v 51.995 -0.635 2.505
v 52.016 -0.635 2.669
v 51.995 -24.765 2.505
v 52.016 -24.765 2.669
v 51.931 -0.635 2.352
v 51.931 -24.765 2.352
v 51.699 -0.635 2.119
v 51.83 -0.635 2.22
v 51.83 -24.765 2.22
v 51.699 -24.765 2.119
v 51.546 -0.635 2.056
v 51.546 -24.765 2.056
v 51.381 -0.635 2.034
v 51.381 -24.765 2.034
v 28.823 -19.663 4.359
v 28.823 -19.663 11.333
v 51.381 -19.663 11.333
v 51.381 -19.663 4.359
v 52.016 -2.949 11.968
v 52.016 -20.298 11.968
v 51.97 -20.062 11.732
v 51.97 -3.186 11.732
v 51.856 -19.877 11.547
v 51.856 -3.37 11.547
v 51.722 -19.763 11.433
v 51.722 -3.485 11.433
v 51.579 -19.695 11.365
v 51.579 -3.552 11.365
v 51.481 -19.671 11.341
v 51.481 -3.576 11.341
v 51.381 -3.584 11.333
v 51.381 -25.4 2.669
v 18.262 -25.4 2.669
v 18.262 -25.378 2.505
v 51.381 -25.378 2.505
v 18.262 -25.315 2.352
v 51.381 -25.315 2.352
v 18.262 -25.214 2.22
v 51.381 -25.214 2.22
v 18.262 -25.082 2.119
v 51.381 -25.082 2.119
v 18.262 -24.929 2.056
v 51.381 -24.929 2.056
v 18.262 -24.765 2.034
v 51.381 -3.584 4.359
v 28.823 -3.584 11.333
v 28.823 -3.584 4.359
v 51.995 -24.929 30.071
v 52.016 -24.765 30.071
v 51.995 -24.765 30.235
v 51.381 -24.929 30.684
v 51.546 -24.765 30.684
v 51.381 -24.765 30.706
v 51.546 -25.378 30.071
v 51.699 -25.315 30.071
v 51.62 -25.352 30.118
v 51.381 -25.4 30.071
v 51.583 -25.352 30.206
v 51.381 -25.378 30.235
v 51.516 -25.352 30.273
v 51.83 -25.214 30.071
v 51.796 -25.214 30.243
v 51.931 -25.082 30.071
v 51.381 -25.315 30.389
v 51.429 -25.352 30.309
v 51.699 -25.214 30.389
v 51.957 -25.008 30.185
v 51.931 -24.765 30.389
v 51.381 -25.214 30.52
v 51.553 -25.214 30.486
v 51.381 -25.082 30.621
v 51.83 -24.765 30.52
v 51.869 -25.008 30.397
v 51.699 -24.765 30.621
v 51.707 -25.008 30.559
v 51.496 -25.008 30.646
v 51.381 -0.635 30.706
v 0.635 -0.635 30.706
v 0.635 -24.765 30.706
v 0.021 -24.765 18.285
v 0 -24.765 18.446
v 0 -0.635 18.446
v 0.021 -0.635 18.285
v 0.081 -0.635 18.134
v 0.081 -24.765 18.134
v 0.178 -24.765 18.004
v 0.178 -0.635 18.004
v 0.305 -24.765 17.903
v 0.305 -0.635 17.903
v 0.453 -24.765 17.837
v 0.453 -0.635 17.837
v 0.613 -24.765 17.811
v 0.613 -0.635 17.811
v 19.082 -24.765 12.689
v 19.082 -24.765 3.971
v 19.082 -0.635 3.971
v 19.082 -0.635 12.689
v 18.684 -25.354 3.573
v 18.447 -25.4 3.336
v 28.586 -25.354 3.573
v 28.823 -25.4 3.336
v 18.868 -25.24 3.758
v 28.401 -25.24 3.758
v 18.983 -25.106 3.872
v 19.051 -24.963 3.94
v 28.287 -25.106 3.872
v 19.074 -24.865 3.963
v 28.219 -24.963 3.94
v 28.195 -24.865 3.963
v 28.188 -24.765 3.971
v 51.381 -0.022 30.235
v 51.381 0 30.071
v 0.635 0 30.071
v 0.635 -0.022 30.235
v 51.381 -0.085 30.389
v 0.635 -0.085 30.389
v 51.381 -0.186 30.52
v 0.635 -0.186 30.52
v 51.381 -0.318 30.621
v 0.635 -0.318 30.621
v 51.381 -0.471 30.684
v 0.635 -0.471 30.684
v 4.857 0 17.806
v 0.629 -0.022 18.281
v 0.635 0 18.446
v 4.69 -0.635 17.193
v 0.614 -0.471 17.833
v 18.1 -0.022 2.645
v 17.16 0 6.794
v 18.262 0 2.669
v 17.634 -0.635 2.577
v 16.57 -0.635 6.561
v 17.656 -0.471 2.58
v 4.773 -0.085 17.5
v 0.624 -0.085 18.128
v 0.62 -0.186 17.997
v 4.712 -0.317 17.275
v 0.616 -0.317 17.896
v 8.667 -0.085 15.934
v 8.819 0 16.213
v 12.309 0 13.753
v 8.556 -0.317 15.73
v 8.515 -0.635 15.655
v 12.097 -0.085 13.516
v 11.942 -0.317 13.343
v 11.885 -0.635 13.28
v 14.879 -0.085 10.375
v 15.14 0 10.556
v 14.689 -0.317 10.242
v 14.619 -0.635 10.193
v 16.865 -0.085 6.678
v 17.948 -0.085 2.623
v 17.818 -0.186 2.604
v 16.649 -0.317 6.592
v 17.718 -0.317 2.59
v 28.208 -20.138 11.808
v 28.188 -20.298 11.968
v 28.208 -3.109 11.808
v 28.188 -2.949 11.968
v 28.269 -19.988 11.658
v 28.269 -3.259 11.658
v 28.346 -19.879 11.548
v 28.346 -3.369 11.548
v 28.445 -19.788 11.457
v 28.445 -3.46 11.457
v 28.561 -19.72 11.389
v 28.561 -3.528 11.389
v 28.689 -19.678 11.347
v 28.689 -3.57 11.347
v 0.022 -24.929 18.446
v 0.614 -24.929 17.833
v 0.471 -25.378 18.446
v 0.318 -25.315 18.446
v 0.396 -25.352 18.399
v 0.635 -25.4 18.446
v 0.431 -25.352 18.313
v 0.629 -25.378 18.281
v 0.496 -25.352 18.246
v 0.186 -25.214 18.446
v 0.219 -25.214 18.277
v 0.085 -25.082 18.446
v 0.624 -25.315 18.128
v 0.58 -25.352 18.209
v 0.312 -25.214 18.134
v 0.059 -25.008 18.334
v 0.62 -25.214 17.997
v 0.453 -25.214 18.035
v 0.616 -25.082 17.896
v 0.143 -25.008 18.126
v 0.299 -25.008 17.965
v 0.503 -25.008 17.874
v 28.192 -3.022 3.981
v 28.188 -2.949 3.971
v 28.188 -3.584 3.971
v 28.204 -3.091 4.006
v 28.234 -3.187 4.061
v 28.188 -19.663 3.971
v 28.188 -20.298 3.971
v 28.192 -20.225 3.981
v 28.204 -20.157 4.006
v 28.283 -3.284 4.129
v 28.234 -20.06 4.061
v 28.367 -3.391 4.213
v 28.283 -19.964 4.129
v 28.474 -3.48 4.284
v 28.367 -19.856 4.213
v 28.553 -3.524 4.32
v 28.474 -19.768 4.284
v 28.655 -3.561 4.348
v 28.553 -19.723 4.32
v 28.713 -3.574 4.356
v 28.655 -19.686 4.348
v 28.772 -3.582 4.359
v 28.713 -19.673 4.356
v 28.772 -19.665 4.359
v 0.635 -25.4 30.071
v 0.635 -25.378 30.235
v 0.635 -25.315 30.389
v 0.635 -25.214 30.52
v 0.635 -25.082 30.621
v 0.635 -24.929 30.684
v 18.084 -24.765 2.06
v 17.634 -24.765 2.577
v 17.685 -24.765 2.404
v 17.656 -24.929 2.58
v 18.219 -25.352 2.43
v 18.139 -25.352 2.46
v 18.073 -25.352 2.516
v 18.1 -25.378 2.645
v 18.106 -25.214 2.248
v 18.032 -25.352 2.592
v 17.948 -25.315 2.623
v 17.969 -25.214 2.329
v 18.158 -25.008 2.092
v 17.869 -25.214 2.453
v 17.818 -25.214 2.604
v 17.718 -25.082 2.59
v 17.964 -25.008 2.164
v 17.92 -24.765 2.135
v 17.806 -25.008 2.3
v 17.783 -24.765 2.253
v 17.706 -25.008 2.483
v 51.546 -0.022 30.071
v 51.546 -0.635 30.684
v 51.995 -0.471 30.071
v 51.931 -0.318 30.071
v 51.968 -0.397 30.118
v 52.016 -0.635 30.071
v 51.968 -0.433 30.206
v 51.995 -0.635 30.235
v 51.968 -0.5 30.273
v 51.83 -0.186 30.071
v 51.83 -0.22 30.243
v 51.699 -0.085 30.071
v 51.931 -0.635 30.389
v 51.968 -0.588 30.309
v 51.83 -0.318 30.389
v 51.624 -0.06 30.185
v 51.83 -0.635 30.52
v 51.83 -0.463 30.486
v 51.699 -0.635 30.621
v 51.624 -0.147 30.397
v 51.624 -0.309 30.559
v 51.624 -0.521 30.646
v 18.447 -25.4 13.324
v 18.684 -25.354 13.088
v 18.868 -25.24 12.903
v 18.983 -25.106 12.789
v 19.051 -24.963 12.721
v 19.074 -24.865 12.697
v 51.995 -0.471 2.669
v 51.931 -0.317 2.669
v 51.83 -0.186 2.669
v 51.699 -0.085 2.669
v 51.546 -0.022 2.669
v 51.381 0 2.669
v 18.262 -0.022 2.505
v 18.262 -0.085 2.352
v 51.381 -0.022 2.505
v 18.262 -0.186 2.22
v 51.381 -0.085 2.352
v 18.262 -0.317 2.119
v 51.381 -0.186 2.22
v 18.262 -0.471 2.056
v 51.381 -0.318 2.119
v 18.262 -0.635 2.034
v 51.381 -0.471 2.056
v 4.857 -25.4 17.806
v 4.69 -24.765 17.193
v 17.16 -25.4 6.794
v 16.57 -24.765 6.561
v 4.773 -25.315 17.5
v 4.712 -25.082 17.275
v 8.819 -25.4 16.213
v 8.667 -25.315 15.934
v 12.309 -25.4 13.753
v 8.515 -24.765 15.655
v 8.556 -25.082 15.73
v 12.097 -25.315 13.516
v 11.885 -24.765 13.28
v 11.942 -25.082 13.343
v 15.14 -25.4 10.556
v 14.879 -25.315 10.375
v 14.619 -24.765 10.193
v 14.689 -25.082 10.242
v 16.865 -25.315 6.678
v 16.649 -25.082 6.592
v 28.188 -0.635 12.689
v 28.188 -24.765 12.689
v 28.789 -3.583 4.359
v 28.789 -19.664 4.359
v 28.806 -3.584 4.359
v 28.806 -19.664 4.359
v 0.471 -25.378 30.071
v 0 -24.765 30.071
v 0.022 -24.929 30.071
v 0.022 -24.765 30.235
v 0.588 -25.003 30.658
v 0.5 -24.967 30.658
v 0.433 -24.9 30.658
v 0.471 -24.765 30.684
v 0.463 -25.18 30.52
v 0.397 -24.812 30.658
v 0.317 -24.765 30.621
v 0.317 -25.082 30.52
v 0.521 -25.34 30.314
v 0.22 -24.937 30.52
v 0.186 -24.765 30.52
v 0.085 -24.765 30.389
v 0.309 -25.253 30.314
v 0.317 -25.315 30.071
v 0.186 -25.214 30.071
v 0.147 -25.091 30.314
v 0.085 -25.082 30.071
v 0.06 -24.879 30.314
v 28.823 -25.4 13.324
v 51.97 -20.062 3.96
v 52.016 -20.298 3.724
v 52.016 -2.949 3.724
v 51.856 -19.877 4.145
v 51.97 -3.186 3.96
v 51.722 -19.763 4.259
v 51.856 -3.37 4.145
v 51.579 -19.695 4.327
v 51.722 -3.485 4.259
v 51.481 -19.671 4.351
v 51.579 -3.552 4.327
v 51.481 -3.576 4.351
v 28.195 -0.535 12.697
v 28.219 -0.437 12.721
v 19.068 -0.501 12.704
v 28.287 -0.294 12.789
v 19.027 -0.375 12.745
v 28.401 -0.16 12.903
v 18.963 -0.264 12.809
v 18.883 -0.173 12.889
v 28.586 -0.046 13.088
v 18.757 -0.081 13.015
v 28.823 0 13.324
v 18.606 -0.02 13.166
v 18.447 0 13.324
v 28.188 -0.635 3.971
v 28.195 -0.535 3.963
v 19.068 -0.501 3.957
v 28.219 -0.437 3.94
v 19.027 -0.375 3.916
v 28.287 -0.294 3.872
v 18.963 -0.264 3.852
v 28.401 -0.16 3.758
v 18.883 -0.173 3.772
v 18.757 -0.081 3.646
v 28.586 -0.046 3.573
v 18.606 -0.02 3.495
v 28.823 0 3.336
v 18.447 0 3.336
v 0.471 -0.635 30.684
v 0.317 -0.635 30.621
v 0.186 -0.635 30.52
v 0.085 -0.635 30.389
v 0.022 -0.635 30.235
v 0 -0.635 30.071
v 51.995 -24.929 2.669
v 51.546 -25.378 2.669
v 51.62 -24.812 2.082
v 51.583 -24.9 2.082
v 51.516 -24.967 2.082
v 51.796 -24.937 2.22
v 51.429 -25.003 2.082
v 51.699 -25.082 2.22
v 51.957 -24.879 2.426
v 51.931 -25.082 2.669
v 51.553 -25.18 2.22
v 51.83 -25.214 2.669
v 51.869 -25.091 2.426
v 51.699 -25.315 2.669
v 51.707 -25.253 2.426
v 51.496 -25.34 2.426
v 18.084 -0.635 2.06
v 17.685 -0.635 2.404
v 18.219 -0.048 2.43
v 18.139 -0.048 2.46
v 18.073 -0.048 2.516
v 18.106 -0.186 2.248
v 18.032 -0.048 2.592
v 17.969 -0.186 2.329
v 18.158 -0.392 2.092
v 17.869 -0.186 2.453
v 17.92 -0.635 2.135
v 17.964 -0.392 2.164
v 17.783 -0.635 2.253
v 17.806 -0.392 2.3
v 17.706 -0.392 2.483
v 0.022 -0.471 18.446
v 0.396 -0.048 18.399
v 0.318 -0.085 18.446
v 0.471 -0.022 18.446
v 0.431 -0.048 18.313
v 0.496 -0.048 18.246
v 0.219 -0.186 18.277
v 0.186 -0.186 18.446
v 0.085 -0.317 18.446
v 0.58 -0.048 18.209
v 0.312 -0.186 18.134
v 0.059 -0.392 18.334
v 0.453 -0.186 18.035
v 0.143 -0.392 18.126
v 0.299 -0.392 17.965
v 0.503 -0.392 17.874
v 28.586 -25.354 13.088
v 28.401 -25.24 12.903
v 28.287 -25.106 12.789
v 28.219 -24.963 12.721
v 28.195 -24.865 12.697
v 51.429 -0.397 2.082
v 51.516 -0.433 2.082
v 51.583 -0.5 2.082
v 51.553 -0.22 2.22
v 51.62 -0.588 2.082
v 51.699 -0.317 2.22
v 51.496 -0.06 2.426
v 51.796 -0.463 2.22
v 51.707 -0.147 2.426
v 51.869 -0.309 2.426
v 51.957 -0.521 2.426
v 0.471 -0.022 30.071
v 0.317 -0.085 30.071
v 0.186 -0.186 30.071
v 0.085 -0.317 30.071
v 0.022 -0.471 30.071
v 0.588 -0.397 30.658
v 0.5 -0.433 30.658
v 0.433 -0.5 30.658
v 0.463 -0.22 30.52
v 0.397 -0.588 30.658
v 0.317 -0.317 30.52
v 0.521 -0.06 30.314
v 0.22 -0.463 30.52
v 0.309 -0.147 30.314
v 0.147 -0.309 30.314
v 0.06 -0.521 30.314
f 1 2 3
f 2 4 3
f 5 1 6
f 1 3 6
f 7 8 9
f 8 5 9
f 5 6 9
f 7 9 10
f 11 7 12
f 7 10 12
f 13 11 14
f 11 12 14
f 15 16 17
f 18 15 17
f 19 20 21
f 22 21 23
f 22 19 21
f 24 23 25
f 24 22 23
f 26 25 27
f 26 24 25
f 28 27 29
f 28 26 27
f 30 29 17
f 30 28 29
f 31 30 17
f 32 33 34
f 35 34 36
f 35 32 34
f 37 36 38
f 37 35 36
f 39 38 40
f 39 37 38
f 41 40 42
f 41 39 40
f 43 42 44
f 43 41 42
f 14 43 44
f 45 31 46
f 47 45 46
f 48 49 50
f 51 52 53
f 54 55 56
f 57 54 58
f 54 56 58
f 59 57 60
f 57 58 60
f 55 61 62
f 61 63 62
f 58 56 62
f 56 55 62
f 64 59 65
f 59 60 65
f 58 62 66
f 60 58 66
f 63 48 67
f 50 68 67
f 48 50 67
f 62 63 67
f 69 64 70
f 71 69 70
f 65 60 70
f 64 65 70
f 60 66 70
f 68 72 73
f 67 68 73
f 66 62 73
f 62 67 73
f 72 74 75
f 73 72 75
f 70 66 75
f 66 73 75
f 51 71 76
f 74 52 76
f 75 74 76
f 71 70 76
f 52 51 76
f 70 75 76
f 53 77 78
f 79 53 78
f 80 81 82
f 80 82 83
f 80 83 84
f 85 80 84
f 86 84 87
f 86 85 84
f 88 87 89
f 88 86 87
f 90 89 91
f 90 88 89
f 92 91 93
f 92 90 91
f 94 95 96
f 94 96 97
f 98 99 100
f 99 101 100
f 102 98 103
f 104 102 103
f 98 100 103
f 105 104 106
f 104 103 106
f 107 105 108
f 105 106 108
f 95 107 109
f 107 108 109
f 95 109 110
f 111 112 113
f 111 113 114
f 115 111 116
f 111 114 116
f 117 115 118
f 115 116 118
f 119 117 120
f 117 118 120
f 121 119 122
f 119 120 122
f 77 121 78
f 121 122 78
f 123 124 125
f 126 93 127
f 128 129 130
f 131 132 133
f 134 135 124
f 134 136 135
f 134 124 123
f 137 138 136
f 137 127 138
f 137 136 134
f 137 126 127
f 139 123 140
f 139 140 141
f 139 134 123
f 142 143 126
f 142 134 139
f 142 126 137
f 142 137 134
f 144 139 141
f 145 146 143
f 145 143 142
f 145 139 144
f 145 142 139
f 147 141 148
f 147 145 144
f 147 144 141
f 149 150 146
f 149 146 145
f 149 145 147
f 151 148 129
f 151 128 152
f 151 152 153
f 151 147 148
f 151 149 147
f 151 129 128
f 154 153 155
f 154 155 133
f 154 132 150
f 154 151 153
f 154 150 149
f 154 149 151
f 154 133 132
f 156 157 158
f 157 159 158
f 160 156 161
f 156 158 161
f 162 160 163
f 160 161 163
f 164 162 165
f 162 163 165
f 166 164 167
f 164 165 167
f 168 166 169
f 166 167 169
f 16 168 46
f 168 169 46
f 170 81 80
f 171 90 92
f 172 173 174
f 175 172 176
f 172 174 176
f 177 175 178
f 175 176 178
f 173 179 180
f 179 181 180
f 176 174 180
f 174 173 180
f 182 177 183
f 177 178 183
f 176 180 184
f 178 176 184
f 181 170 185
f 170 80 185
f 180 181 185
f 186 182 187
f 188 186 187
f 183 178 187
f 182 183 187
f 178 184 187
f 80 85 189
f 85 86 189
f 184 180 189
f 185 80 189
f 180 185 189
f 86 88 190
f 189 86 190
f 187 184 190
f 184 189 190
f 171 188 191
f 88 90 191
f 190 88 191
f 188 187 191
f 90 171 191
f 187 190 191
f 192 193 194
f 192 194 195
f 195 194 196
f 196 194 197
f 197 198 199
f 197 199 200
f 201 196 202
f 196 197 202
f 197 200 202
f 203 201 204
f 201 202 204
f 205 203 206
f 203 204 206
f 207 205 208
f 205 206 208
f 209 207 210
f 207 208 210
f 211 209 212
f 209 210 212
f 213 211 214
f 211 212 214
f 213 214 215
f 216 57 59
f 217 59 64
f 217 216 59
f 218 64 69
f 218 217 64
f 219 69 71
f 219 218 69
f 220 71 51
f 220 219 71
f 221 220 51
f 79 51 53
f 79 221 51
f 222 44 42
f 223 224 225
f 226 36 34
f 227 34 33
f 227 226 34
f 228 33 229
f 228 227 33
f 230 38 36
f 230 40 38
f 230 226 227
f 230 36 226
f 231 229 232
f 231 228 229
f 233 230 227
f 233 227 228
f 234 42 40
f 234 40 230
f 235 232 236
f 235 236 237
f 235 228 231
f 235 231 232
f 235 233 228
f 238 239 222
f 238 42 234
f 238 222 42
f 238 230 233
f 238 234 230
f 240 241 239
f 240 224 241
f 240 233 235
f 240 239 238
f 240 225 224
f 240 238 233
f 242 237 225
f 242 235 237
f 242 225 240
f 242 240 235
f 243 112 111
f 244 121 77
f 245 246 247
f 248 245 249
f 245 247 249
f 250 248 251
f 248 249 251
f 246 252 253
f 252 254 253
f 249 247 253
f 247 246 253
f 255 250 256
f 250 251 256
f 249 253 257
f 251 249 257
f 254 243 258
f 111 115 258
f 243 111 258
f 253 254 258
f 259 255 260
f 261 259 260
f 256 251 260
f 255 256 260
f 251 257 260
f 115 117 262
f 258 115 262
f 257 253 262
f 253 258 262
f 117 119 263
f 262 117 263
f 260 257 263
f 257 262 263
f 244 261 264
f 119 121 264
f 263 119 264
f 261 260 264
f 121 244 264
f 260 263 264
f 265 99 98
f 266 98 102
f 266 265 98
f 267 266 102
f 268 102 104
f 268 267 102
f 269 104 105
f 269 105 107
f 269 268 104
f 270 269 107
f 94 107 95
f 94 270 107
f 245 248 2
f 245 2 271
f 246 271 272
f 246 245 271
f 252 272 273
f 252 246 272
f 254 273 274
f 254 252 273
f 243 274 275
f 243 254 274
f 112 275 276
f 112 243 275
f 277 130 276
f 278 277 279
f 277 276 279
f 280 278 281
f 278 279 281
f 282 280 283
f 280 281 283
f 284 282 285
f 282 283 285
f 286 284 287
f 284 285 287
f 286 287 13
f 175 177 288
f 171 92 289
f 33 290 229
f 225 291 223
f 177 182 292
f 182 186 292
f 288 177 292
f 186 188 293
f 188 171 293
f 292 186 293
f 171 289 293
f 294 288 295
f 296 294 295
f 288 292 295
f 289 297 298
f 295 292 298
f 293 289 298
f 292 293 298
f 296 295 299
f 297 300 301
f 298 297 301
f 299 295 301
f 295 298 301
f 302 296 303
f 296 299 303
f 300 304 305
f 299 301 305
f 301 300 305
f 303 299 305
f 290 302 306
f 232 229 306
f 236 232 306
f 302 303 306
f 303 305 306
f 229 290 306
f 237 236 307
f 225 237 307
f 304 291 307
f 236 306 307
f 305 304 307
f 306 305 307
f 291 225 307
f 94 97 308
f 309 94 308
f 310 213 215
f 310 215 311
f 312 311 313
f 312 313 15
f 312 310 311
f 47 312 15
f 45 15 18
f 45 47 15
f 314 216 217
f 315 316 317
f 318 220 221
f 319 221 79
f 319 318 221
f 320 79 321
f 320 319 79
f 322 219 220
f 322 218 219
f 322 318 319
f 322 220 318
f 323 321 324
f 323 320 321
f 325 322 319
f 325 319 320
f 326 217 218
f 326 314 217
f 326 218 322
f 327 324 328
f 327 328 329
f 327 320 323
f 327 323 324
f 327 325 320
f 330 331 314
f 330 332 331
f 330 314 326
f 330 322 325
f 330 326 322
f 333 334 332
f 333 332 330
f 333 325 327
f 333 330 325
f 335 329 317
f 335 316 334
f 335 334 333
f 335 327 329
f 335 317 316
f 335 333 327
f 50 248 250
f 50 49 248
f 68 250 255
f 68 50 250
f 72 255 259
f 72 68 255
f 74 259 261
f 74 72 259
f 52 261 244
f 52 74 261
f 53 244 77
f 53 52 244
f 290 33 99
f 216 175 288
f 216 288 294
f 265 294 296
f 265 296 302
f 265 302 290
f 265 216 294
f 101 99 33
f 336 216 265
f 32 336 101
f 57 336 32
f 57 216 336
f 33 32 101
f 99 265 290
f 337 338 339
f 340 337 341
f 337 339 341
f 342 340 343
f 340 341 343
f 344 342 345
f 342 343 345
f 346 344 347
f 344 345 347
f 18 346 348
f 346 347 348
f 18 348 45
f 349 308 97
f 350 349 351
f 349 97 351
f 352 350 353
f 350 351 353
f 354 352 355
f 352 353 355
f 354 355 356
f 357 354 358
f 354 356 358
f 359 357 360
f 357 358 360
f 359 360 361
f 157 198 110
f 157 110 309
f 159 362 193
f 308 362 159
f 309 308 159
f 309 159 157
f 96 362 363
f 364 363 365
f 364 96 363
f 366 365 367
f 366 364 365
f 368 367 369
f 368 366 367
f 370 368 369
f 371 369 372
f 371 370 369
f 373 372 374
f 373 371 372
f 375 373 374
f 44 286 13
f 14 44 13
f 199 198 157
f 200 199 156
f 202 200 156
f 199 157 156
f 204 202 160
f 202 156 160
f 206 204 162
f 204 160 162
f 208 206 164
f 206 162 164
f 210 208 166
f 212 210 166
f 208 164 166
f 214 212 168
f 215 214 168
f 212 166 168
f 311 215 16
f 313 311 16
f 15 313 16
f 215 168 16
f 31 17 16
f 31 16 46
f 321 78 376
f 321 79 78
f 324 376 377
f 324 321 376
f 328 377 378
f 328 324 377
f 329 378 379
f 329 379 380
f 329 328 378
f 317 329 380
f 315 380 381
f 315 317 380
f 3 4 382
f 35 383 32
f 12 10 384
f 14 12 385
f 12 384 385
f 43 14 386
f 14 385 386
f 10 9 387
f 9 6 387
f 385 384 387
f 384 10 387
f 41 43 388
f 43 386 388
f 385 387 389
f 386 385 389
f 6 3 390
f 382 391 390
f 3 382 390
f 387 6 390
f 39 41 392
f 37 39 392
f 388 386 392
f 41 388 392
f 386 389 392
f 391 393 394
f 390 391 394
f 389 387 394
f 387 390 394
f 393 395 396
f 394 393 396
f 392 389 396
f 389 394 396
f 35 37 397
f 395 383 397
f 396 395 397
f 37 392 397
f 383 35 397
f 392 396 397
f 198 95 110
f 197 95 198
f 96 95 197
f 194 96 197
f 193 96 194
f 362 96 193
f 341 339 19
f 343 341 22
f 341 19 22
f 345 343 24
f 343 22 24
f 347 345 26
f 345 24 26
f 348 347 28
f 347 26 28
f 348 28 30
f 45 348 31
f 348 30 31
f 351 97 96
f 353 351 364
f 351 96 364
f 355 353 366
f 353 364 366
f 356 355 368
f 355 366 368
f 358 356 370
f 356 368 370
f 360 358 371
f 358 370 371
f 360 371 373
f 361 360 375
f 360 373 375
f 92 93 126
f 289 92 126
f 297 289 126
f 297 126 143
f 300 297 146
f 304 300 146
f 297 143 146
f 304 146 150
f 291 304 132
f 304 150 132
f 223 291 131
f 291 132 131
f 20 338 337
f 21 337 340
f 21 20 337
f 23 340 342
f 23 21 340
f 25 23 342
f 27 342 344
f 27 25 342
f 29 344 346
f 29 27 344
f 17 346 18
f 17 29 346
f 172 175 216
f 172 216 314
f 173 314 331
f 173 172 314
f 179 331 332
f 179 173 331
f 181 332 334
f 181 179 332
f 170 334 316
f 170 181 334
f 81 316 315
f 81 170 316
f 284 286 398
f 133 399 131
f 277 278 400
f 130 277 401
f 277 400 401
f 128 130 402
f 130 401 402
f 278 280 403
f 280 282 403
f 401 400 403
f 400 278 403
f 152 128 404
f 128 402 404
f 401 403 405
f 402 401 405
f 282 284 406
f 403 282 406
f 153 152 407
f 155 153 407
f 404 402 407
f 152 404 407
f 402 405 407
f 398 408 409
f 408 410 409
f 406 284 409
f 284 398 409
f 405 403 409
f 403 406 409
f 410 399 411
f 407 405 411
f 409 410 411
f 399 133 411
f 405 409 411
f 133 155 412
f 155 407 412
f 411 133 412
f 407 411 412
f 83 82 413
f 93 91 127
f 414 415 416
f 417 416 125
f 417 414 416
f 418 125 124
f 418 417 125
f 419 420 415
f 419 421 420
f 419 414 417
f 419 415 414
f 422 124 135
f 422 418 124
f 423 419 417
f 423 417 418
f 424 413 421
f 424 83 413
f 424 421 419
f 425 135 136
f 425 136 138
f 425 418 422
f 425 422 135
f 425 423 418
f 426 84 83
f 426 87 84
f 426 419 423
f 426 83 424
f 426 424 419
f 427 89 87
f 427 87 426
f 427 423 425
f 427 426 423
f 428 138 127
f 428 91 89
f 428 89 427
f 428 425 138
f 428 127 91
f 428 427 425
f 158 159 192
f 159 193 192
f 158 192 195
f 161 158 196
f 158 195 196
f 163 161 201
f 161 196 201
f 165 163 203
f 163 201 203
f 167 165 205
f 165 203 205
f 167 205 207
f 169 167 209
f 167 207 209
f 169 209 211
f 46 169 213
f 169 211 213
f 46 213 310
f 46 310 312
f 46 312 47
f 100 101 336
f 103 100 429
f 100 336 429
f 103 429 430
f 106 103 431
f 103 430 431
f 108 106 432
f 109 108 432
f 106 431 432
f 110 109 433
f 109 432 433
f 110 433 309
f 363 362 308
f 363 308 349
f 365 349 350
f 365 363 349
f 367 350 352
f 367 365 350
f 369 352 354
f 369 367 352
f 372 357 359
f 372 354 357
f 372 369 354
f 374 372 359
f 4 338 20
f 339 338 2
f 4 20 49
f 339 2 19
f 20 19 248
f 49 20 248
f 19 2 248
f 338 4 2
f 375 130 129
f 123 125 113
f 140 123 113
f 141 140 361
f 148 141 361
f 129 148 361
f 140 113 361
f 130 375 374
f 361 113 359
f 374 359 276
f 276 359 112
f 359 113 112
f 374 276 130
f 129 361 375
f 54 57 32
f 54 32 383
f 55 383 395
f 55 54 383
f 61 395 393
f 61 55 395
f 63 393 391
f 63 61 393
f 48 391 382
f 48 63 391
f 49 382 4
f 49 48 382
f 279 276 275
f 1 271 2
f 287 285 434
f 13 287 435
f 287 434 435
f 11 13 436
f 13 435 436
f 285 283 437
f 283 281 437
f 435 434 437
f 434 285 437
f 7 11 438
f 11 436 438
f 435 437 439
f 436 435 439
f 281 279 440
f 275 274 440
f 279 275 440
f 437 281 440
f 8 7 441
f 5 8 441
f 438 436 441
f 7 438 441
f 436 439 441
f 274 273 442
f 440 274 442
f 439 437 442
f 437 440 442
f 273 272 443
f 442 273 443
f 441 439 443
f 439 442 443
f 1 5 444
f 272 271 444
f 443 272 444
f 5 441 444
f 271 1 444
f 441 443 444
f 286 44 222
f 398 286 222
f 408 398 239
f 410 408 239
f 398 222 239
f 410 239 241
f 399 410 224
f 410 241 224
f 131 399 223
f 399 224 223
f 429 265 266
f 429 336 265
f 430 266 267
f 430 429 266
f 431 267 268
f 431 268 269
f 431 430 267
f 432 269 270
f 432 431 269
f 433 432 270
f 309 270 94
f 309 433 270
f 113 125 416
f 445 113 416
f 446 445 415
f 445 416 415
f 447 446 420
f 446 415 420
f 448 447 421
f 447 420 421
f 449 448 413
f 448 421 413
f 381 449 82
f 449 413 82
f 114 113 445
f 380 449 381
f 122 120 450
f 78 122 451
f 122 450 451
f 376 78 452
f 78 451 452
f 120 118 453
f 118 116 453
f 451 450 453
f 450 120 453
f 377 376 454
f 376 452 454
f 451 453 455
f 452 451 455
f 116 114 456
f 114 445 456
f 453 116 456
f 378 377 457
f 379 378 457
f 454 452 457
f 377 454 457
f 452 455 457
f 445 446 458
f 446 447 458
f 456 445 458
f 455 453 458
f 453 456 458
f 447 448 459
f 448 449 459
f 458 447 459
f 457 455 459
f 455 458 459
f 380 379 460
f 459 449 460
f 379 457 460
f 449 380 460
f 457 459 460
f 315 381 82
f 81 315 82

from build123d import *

# Parameters (mm, degrees)
F0_W         = 9.105252102
F0_H         = 8.7177967653
F1_DEPTH     = 25.4
F2_W         = 16.0794917028
F2_H         = 6.9742375053
F3_DEPTH     = 23.8286424428
F4_R         = 0.635
F5_T1_DEPTH  = 16.0794917028
F5_T3_DEPTH  = 6.9742375053
F5_T5_DEPTH  = 8.7177967653
F5_T7_DEPTH  = 9.105252102
F5_T13_DEPTH = 17.6669917028
F5_T17_DEPTH = 8.5617375053
F5_T25_DEPTH = 17.6669917028
F5_T29_DEPTH = 8.5617375053
F5_T37_DEPTH = 8.5617375053
F5_T42_DEPTH = 17.5413992589
F5_T49_DEPTH = 17.5413992589
F5_T53_DEPTH = 8.5617375053
F5_T61_DEPTH = 10.3052967653
F5_T65_DEPTH = 10.692752102
F5_T72_DEPTH = 10.692752102
F5_T76_DEPTH = 10.3052967653
F5_T83_DEPTH = 10.692752102
F5_T87_DEPTH = 10.3052967653
F5_T94_DEPTH = 10.3052967653
F5_T98_DEPTH = 10.692752102
F6_R         = 0.635


# Not quite as in the source:
# - a fillet or chamfer that OpenCascade refuses, or shapes differently, is made with other operations: its cross-section is extruded or revolved along the edge and cut away or added


with BuildPart() as f1:
    # F0 (on Front) → F1 (new body)
    with BuildSketch(Plane.XZ):
        with BuildLine():
            ThreePointArc((0, 17.8214723471), (11.860718486, 13.3014372763), (17.7050021368, 2.0341523923))
            Line((17.7050021368, 2.0341523923), (52.0161837339, 2.0341523923))
            Line((52.0161837339, 2.0341523923), (52.0161837339, 30.7060163468))
            Line((52.0161837339, 30.7060163468), (0, 30.7060163468))
            Line((0, 30.7060163468), (0, 17.8214723471))
        make_face()
        with Locations((23.6349152401, 8.3303391002)):
            Rectangle(F0_W, F0_H, mode=Mode.SUBTRACT)
    extrude(amount=F1_DEPTH)

    # F2 (on face) → F3 (cut, through all)
    with BuildSketch(Plane.YZ.offset(52.0161837339)):
        with Locations((-11.6237296024, 7.8460171353)):
            Rectangle(F2_W, F2_H)
    extrude(amount=-F3_DEPTH, mode=Mode.SUBTRACT)

    # F4
    f4_edges = [f1.edges().sort_by_distance(p)[0] for p in [
        (23.634915, -25.4, 3.971441),
        (19.082289, -25.4, 8.330339),
        (23.634915, -25.4, 12.689237),
        (28.187541, -25.4, 8.330339),
        (52.016184, -11.62373, 4.358898),
        (52.016184, -19.663475, 7.846017),
        (52.016184, -11.62373, 11.333136),
        (52.016184, -3.583984, 7.846017),
    ]]
    fillet(f4_edges, radius=F4_R)

    # F5: fillet of radius 0.635 on 8 edges, made by hand

    # F5_s2 → F5_t1 (cut)
    with BuildSketch(Plane.XZ.offset(3.583983751)):
        with BuildLine():
            ThreePointArc((28.1875412911, 11.968135888), (28.3735284851, 11.5191230819), (28.8225412911, 11.333135888))
            Line((28.8225412911, 11.333135888), (28.1875412911, 11.333135888))
            Line((28.1875412911, 11.333135888), (28.1875412911, 11.968135888))
        make_face()
        with BuildLine():
            ThreePointArc((28.1875412911, 3.9714407176), (28.421565367, 4.2532443861), (28.7723043136, 4.3588983826))
            Line((28.7723043136, 4.3588983826), (28.1875412911, 4.3588983826))
            Line((28.1875412911, 4.3588983826), (28.1875412911, 3.9714407176))
        make_face()
    extrude(amount=F5_T1_DEPTH, mode=Mode.SUBTRACT)

    # F5_s4 → F5_t3 (cut)
    with BuildSketch(Plane.XY.offset(4.3588983826)):
        with BuildLine():
            ThreePointArc((28.1875412911, -20.2984754539), (28.3735284851, -19.8494626478), (28.8225412911, -19.6634754539))
            Line((28.8225412911, -19.6634754539), (28.1875412911, -19.6634754539))
            Line((28.1875412911, -19.6634754539), (28.1875412911, -20.2984754539))
        make_face()
        with BuildLine():
            ThreePointArc((28.1875412911, -2.948983751), (28.3735284851, -3.3979965571), (28.8225412911, -3.583983751))
            Line((28.8225412911, -3.583983751), (28.1875412911, -3.583983751))
            Line((28.1875412911, -3.583983751), (28.1875412911, -2.948983751))
        make_face()
    extrude(amount=F5_T3_DEPTH, mode=Mode.SUBTRACT)

    # F5_s6 → F5_t5 (cut)
    with BuildSketch(Plane.XY.offset(3.9714407176)):
        with BuildLine():
            ThreePointArc((28.1875412911, -0.635), (28.3735284851, -0.1859871939), (28.8225412911, 0))
            Line((28.8225412911, 0), (28.1875412911, 0))
            Line((28.1875412911, 0), (28.1875412911, -0.635))
        make_face()
        with BuildLine():
            ThreePointArc((19.0822891891, -0.635), (18.8963019952, -0.1859871939), (18.4472891891, 0))
            Line((18.4472891891, 0), (19.0822891891, 0))
            Line((19.0822891891, 0), (19.0822891891, -0.635))
        make_face()
    extrude(amount=F5_T5_DEPTH, mode=Mode.SUBTRACT)

    # F5_s8 → F5_t7 (cut)
    with BuildSketch(Plane.YZ.offset(19.0822891891)):
        with BuildLine():
            ThreePointArc((-0.635, 12.6892374828), (-0.1859871939, 12.8752246768), (0, 13.3242374828))
            Line((0, 13.3242374828), (0, 12.6892374828))
            Line((0, 12.6892374828), (-0.635, 12.6892374828))
        make_face()
        with BuildLine():
            ThreePointArc((-0.635, 3.9714407176), (-0.1859871939, 3.7854535236), (0, 3.3364407176))
            Line((0, 3.3364407176), (0, 3.9714407176))
            Line((0, 3.9714407176), (-0.635, 3.9714407176))
        make_face()
    extrude(amount=F5_T7_DEPTH, mode=Mode.SUBTRACT)


with BuildPart() as f5_tool11:
    # F5_s12 → F5_t13 (new body)
    with BuildSketch(Plane.XZ.offset(1.996483751)):
        with BuildLine():
            ThreePointArc((28.1875412911, 11.968135888), (28.3735284851, 11.5191230819), (28.8225412911, 11.333135888))
            Line((28.8225412911, 11.333135888), (28.1875412911, 11.333135888))
            Line((28.1875412911, 11.333135888), (28.1875412911, 11.968135888))
        make_face()
    extrude(amount=F5_T13_DEPTH)

    split(bisect_by=Plane.XZ.offset(3.583983751), keep=Keep.BOTTOM)


with BuildPart() as f5_tool15:
    # F5_s16 → F5_t17 (new body)
    with BuildSketch(Plane.XY.offset(4.3588983826)):
        with BuildLine():
            ThreePointArc((28.1875412911, -2.948983751), (28.3735284851, -3.3979965571), (28.8225412911, -3.583983751))
            Line((28.8225412911, -3.583983751), (28.1875412911, -3.583983751))
            Line((28.1875412911, -3.583983751), (28.1875412911, -2.948983751))
        make_face()
    extrude(amount=F5_T17_DEPTH)

    split(bisect_by=Plane.XY.offset(12.6892374828), keep=Keep.BOTTOM)

    split(bisect_by=Plane.XY.offset(11.333135888), keep=Keep.TOP)


with BuildPart() as f5_tool11_1:
    add(f5_tool11.part)

    # F5_t20: intersect F5_tool15
    add(f5_tool15.part, mode=Mode.INTERSECT)


with BuildPart() as f1_1:
    add(f1.part)

    # F5_t9: cut F5_tool11
    add(f5_tool11_1.part, mode=Mode.SUBTRACT)


with BuildPart() as f5_tool23:
    # F5_s24 → F5_t25 (new body)
    with BuildSketch(Plane.XZ.offset(3.583983751)):
        with BuildLine():
            ThreePointArc((28.1875412911, 11.968135888), (28.3735284851, 11.5191230819), (28.8225412911, 11.333135888))
            Line((28.8225412911, 11.333135888), (28.1875412911, 11.333135888))
            Line((28.1875412911, 11.333135888), (28.1875412911, 11.968135888))
        make_face()
    extrude(amount=F5_T25_DEPTH)

    split(bisect_by=Plane.XZ.offset(19.6634754539), keep=Keep.TOP)


with BuildPart() as f5_tool27:
    # F5_s28 → F5_t29 (new body)
    with BuildSketch(Plane.XY.offset(12.920635888)):
        with BuildLine():
            ThreePointArc((28.1875412911, -20.2984754539), (28.3735284851, -19.8494626478), (28.8225412911, -19.6634754539))
            Line((28.8225412911, -19.6634754539), (28.1875412911, -19.6634754539))
            Line((28.1875412911, -19.6634754539), (28.1875412911, -20.2984754539))
        make_face()
    extrude(amount=-F5_T29_DEPTH)

    split(bisect_by=Plane.XY.offset(12.6892374828), keep=Keep.BOTTOM)

    split(bisect_by=Plane.XY.offset(11.333135888), keep=Keep.TOP)


with BuildPart() as f5_tool23_1:
    add(f5_tool23.part)

    # F5_t32: intersect F5_tool27
    add(f5_tool27.part, mode=Mode.INTERSECT)


with BuildPart() as f1_2:
    add(f1_1.part)

    # F5_t21: cut F5_tool23
    add(f5_tool23_1.part, mode=Mode.SUBTRACT)


with BuildPart() as f5_tool35:
    # F5_s36 → F5_t37 (new body)
    with BuildSketch(Plane.XY.offset(11.333135888)):
        with BuildLine():
            ThreePointArc((28.1875412911, -20.2984754539), (28.3735284851, -19.8494626478), (28.8225412911, -19.6634754539))
            Line((28.8225412911, -19.6634754539), (28.1875412911, -19.6634754539))
            Line((28.1875412911, -19.6634754539), (28.1875412911, -20.2984754539))
        make_face()
    extrude(amount=-F5_T37_DEPTH)

    split(bisect_by=Plane.XY.offset(3.9714407176), keep=Keep.TOP)

    split(bisect_by=Plane.XY.offset(4.3588983826), keep=Keep.BOTTOM)


with BuildPart() as f5_tool40:
    # F5_s41 → F5_t42 (new body)
    with BuildSketch(Plane.XZ.offset(21.1253830099)):
        with BuildLine():
            ThreePointArc((28.1875412911, 3.9714407176), (28.421565367, 4.2532443861), (28.7723043136, 4.3588983826))
            Line((28.7723043136, 4.3588983826), (28.1875412911, 4.3588983826))
            Line((28.1875412911, 4.3588983826), (28.1875412911, 3.9714407176))
        make_face()
    extrude(amount=-F5_T42_DEPTH)

    split(bisect_by=Plane.XZ.offset(19.6634754539), keep=Keep.TOP)


with BuildPart() as f5_tool35_1:
    add(f5_tool35.part)

    # F5_t44: intersect F5_tool40
    add(f5_tool40.part, mode=Mode.INTERSECT)


with BuildPart() as f1_3:
    add(f1_2.part)

    # F5_t33: cut F5_tool35
    add(f5_tool35_1.part, mode=Mode.SUBTRACT)


with BuildPart() as f5_tool47:
    # F5_s48 → F5_t49 (new body)
    with BuildSketch(Plane.XZ.offset(19.6634754539)):
        with BuildLine():
            ThreePointArc((28.1875412911, 3.9714407176), (28.421565367, 4.2532443861), (28.7723043136, 4.3588983826))
            Line((28.7723043136, 4.3588983826), (28.1875412911, 4.3588983826))
            Line((28.1875412911, 4.3588983826), (28.1875412911, 3.9714407176))
        make_face()
    extrude(amount=-F5_T49_DEPTH)

    split(bisect_by=Plane.XZ.offset(3.583983751), keep=Keep.BOTTOM)


with BuildPart() as f5_tool51:
    # F5_s52 → F5_t53 (new body)
    with BuildSketch(Plane.XY.offset(2.7713983826)):
        with BuildLine():
            ThreePointArc((28.1875412911, -2.948983751), (28.3735284851, -3.3979965571), (28.8225412911, -3.583983751))
            Line((28.8225412911, -3.583983751), (28.1875412911, -3.583983751))
            Line((28.1875412911, -3.583983751), (28.1875412911, -2.948983751))
        make_face()
    extrude(amount=F5_T53_DEPTH)

    split(bisect_by=Plane.XY.offset(3.9714407176), keep=Keep.TOP)

    split(bisect_by=Plane.XY.offset(4.3588983826), keep=Keep.BOTTOM)


with BuildPart() as f5_tool47_1:
    add(f5_tool47.part)

    # F5_t56: intersect F5_tool51
    add(f5_tool51.part, mode=Mode.INTERSECT)


with BuildPart() as f1_4:
    add(f1_3.part)

    # F5_t45: cut F5_tool47
    add(f5_tool47_1.part, mode=Mode.SUBTRACT)


with BuildPart() as f5_tool59:
    # F5_s60 → F5_t61 (new body)
    with BuildSketch(Plane.XY.offset(14.2767374828)):
        with BuildLine():
            ThreePointArc((28.1875412911, -0.635), (28.3735284851, -0.1859871939), (28.8225412911, 0))
            Line((28.8225412911, 0), (28.1875412911, 0))
            Line((28.1875412911, 0), (28.1875412911, -0.635))
        make_face()
    extrude(amount=-F5_T61_DEPTH)

    split(bisect_by=Plane.XY.offset(12.6892374828), keep=Keep.TOP)


with BuildPart() as f5_tool63:
    # F5_s64 → F5_t65 (new body)
    with BuildSketch(Plane.YZ.offset(19.0822891891)):
        with BuildLine():
            ThreePointArc((-0.635, 12.6892374828), (-0.1859871939, 12.8752246768), (0, 13.3242374828))
            Line((0, 13.3242374828), (0, 12.6892374828))
            Line((0, 12.6892374828), (-0.635, 12.6892374828))
        make_face()
    extrude(amount=F5_T65_DEPTH)

    split(bisect_by=Plane.YZ.offset(28.1875412911), keep=Keep.TOP)


with BuildPart() as f5_tool59_1:
    add(f5_tool59.part)

    # F5_t67: intersect F5_tool63
    add(f5_tool63.part, mode=Mode.INTERSECT)


with BuildPart() as f1_5:
    add(f1_4.part)

    # F5_t57: cut F5_tool59
    add(f5_tool59_1.part, mode=Mode.SUBTRACT)


with BuildPart() as f5_tool70:
    # F5_s71 → F5_t72 (new body)
    with BuildSketch(Plane.YZ.offset(29.7750412911)):
        with BuildLine():
            ThreePointArc((-0.635, 3.9714407176), (-0.1859871939, 3.7854535236), (0, 3.3364407176))
            Line((0, 3.3364407176), (0, 3.9714407176))
            Line((0, 3.9714407176), (-0.635, 3.9714407176))
        make_face()
    extrude(amount=-F5_T72_DEPTH)

    split(bisect_by=Plane.YZ.offset(28.1875412911), keep=Keep.TOP)


with BuildPart() as f5_tool74:
    # F5_s75 → F5_t76 (new body)
    with BuildSketch(Plane.XY.offset(12.6892374828)):
        with BuildLine():
            ThreePointArc((28.1875412911, -0.635), (28.3735284851, -0.1859871939), (28.8225412911, 0))
            Line((28.8225412911, 0), (28.1875412911, 0))
            Line((28.1875412911, 0), (28.1875412911, -0.635))
        make_face()
    extrude(amount=-F5_T76_DEPTH)

    split(bisect_by=Plane.XY.offset(3.9714407176), keep=Keep.BOTTOM)


with BuildPart() as f5_tool70_1:
    add(f5_tool70.part)

    # F5_t78: intersect F5_tool74
    add(f5_tool74.part, mode=Mode.INTERSECT)


with BuildPart() as f1_6:
    add(f1_5.part)

    # F5_t68: cut F5_tool70
    add(f5_tool70_1.part, mode=Mode.SUBTRACT)


with BuildPart() as f5_tool81:
    # F5_s82 → F5_t83 (new body)
    with BuildSketch(Plane.YZ.offset(28.1875412911)):
        with BuildLine():
            ThreePointArc((-0.635, 3.9714407176), (-0.1859871939, 3.7854535236), (0, 3.3364407176))
            Line((0, 3.3364407176), (0, 3.9714407176))
            Line((0, 3.9714407176), (-0.635, 3.9714407176))
        make_face()
    extrude(amount=-F5_T83_DEPTH)

    split(bisect_by=Plane.YZ.offset(19.0822891891), keep=Keep.BOTTOM)


with BuildPart() as f5_tool85:
    # F5_s86 → F5_t87 (new body)
    with BuildSketch(Plane.XY.offset(2.3839407176)):
        with BuildLine():
            ThreePointArc((19.0822891891, -0.635), (18.8963019952, -0.1859871939), (18.4472891891, 0))
            Line((18.4472891891, 0), (19.0822891891, 0))
            Line((19.0822891891, 0), (19.0822891891, -0.635))
        make_face()
    extrude(amount=F5_T87_DEPTH)

    split(bisect_by=Plane.XY.offset(3.9714407176), keep=Keep.BOTTOM)


with BuildPart() as f5_tool81_1:
    add(f5_tool81.part)

    # F5_t89: intersect F5_tool85
    add(f5_tool85.part, mode=Mode.INTERSECT)


with BuildPart() as f1_7:
    add(f1_6.part)

    # F5_t79: cut F5_tool81
    add(f5_tool81_1.part, mode=Mode.SUBTRACT)


with BuildPart() as f5_tool92:
    # F5_s93 → F5_t94 (new body)
    with BuildSketch(Plane.XY.offset(3.9714407176)):
        with BuildLine():
            ThreePointArc((19.0822891891, -0.635), (18.8963019952, -0.1859871939), (18.4472891891, 0))
            Line((18.4472891891, 0), (19.0822891891, 0))
            Line((19.0822891891, 0), (19.0822891891, -0.635))
        make_face()
    extrude(amount=F5_T94_DEPTH)

    split(bisect_by=Plane.XY.offset(12.6892374828), keep=Keep.TOP)


with BuildPart() as f5_tool96:
    # F5_s97 → F5_t98 (new body)
    with BuildSketch(Plane.YZ.offset(17.4947891891)):
        with BuildLine():
            ThreePointArc((-0.635, 12.6892374828), (-0.1859871939, 12.8752246768), (0, 13.3242374828))
            Line((0, 13.3242374828), (0, 12.6892374828))
            Line((0, 12.6892374828), (-0.635, 12.6892374828))
        make_face()
    extrude(amount=F5_T98_DEPTH)

    split(bisect_by=Plane.YZ.offset(19.0822891891), keep=Keep.BOTTOM)


with BuildPart() as f5_tool92_1:
    add(f5_tool92.part)

    # F5_t100: intersect F5_tool96
    add(f5_tool96.part, mode=Mode.INTERSECT)


with BuildPart() as f1_8:
    add(f1_7.part)

    # F5_t90: cut F5_tool92
    add(f5_tool92_1.part, mode=Mode.SUBTRACT)

    # F6
    f6_edges = [f1_8.edges().sort_by_distance(p)[0] for p in [
        (11.860718, 0, 13.301437),
        (11.860718, -25.4, 13.301437),
        (17.705002, -12.7, 2.034152),
        (0, -12.7, 17.821472),
        (0, 0, 24.263744),
        (0, -25.4, 24.263744),
        (26.008092, 0, 30.706016),
        (52.016184, 0, 16.370084),
        (34.860593, 0, 2.034152),
        (52.016184, -12.7, 30.706016),
        (52.016184, -25.4, 16.370084),
        (52.016184, -12.7, 2.034152),
        (26.008092, -25.4, 30.706016),
        (0, -12.7, 30.706016),
        (34.860593, -25.4, 2.034152),
    ]]
    fillet(f6_edges, radius=F6_R)


solid = f1_8.part
